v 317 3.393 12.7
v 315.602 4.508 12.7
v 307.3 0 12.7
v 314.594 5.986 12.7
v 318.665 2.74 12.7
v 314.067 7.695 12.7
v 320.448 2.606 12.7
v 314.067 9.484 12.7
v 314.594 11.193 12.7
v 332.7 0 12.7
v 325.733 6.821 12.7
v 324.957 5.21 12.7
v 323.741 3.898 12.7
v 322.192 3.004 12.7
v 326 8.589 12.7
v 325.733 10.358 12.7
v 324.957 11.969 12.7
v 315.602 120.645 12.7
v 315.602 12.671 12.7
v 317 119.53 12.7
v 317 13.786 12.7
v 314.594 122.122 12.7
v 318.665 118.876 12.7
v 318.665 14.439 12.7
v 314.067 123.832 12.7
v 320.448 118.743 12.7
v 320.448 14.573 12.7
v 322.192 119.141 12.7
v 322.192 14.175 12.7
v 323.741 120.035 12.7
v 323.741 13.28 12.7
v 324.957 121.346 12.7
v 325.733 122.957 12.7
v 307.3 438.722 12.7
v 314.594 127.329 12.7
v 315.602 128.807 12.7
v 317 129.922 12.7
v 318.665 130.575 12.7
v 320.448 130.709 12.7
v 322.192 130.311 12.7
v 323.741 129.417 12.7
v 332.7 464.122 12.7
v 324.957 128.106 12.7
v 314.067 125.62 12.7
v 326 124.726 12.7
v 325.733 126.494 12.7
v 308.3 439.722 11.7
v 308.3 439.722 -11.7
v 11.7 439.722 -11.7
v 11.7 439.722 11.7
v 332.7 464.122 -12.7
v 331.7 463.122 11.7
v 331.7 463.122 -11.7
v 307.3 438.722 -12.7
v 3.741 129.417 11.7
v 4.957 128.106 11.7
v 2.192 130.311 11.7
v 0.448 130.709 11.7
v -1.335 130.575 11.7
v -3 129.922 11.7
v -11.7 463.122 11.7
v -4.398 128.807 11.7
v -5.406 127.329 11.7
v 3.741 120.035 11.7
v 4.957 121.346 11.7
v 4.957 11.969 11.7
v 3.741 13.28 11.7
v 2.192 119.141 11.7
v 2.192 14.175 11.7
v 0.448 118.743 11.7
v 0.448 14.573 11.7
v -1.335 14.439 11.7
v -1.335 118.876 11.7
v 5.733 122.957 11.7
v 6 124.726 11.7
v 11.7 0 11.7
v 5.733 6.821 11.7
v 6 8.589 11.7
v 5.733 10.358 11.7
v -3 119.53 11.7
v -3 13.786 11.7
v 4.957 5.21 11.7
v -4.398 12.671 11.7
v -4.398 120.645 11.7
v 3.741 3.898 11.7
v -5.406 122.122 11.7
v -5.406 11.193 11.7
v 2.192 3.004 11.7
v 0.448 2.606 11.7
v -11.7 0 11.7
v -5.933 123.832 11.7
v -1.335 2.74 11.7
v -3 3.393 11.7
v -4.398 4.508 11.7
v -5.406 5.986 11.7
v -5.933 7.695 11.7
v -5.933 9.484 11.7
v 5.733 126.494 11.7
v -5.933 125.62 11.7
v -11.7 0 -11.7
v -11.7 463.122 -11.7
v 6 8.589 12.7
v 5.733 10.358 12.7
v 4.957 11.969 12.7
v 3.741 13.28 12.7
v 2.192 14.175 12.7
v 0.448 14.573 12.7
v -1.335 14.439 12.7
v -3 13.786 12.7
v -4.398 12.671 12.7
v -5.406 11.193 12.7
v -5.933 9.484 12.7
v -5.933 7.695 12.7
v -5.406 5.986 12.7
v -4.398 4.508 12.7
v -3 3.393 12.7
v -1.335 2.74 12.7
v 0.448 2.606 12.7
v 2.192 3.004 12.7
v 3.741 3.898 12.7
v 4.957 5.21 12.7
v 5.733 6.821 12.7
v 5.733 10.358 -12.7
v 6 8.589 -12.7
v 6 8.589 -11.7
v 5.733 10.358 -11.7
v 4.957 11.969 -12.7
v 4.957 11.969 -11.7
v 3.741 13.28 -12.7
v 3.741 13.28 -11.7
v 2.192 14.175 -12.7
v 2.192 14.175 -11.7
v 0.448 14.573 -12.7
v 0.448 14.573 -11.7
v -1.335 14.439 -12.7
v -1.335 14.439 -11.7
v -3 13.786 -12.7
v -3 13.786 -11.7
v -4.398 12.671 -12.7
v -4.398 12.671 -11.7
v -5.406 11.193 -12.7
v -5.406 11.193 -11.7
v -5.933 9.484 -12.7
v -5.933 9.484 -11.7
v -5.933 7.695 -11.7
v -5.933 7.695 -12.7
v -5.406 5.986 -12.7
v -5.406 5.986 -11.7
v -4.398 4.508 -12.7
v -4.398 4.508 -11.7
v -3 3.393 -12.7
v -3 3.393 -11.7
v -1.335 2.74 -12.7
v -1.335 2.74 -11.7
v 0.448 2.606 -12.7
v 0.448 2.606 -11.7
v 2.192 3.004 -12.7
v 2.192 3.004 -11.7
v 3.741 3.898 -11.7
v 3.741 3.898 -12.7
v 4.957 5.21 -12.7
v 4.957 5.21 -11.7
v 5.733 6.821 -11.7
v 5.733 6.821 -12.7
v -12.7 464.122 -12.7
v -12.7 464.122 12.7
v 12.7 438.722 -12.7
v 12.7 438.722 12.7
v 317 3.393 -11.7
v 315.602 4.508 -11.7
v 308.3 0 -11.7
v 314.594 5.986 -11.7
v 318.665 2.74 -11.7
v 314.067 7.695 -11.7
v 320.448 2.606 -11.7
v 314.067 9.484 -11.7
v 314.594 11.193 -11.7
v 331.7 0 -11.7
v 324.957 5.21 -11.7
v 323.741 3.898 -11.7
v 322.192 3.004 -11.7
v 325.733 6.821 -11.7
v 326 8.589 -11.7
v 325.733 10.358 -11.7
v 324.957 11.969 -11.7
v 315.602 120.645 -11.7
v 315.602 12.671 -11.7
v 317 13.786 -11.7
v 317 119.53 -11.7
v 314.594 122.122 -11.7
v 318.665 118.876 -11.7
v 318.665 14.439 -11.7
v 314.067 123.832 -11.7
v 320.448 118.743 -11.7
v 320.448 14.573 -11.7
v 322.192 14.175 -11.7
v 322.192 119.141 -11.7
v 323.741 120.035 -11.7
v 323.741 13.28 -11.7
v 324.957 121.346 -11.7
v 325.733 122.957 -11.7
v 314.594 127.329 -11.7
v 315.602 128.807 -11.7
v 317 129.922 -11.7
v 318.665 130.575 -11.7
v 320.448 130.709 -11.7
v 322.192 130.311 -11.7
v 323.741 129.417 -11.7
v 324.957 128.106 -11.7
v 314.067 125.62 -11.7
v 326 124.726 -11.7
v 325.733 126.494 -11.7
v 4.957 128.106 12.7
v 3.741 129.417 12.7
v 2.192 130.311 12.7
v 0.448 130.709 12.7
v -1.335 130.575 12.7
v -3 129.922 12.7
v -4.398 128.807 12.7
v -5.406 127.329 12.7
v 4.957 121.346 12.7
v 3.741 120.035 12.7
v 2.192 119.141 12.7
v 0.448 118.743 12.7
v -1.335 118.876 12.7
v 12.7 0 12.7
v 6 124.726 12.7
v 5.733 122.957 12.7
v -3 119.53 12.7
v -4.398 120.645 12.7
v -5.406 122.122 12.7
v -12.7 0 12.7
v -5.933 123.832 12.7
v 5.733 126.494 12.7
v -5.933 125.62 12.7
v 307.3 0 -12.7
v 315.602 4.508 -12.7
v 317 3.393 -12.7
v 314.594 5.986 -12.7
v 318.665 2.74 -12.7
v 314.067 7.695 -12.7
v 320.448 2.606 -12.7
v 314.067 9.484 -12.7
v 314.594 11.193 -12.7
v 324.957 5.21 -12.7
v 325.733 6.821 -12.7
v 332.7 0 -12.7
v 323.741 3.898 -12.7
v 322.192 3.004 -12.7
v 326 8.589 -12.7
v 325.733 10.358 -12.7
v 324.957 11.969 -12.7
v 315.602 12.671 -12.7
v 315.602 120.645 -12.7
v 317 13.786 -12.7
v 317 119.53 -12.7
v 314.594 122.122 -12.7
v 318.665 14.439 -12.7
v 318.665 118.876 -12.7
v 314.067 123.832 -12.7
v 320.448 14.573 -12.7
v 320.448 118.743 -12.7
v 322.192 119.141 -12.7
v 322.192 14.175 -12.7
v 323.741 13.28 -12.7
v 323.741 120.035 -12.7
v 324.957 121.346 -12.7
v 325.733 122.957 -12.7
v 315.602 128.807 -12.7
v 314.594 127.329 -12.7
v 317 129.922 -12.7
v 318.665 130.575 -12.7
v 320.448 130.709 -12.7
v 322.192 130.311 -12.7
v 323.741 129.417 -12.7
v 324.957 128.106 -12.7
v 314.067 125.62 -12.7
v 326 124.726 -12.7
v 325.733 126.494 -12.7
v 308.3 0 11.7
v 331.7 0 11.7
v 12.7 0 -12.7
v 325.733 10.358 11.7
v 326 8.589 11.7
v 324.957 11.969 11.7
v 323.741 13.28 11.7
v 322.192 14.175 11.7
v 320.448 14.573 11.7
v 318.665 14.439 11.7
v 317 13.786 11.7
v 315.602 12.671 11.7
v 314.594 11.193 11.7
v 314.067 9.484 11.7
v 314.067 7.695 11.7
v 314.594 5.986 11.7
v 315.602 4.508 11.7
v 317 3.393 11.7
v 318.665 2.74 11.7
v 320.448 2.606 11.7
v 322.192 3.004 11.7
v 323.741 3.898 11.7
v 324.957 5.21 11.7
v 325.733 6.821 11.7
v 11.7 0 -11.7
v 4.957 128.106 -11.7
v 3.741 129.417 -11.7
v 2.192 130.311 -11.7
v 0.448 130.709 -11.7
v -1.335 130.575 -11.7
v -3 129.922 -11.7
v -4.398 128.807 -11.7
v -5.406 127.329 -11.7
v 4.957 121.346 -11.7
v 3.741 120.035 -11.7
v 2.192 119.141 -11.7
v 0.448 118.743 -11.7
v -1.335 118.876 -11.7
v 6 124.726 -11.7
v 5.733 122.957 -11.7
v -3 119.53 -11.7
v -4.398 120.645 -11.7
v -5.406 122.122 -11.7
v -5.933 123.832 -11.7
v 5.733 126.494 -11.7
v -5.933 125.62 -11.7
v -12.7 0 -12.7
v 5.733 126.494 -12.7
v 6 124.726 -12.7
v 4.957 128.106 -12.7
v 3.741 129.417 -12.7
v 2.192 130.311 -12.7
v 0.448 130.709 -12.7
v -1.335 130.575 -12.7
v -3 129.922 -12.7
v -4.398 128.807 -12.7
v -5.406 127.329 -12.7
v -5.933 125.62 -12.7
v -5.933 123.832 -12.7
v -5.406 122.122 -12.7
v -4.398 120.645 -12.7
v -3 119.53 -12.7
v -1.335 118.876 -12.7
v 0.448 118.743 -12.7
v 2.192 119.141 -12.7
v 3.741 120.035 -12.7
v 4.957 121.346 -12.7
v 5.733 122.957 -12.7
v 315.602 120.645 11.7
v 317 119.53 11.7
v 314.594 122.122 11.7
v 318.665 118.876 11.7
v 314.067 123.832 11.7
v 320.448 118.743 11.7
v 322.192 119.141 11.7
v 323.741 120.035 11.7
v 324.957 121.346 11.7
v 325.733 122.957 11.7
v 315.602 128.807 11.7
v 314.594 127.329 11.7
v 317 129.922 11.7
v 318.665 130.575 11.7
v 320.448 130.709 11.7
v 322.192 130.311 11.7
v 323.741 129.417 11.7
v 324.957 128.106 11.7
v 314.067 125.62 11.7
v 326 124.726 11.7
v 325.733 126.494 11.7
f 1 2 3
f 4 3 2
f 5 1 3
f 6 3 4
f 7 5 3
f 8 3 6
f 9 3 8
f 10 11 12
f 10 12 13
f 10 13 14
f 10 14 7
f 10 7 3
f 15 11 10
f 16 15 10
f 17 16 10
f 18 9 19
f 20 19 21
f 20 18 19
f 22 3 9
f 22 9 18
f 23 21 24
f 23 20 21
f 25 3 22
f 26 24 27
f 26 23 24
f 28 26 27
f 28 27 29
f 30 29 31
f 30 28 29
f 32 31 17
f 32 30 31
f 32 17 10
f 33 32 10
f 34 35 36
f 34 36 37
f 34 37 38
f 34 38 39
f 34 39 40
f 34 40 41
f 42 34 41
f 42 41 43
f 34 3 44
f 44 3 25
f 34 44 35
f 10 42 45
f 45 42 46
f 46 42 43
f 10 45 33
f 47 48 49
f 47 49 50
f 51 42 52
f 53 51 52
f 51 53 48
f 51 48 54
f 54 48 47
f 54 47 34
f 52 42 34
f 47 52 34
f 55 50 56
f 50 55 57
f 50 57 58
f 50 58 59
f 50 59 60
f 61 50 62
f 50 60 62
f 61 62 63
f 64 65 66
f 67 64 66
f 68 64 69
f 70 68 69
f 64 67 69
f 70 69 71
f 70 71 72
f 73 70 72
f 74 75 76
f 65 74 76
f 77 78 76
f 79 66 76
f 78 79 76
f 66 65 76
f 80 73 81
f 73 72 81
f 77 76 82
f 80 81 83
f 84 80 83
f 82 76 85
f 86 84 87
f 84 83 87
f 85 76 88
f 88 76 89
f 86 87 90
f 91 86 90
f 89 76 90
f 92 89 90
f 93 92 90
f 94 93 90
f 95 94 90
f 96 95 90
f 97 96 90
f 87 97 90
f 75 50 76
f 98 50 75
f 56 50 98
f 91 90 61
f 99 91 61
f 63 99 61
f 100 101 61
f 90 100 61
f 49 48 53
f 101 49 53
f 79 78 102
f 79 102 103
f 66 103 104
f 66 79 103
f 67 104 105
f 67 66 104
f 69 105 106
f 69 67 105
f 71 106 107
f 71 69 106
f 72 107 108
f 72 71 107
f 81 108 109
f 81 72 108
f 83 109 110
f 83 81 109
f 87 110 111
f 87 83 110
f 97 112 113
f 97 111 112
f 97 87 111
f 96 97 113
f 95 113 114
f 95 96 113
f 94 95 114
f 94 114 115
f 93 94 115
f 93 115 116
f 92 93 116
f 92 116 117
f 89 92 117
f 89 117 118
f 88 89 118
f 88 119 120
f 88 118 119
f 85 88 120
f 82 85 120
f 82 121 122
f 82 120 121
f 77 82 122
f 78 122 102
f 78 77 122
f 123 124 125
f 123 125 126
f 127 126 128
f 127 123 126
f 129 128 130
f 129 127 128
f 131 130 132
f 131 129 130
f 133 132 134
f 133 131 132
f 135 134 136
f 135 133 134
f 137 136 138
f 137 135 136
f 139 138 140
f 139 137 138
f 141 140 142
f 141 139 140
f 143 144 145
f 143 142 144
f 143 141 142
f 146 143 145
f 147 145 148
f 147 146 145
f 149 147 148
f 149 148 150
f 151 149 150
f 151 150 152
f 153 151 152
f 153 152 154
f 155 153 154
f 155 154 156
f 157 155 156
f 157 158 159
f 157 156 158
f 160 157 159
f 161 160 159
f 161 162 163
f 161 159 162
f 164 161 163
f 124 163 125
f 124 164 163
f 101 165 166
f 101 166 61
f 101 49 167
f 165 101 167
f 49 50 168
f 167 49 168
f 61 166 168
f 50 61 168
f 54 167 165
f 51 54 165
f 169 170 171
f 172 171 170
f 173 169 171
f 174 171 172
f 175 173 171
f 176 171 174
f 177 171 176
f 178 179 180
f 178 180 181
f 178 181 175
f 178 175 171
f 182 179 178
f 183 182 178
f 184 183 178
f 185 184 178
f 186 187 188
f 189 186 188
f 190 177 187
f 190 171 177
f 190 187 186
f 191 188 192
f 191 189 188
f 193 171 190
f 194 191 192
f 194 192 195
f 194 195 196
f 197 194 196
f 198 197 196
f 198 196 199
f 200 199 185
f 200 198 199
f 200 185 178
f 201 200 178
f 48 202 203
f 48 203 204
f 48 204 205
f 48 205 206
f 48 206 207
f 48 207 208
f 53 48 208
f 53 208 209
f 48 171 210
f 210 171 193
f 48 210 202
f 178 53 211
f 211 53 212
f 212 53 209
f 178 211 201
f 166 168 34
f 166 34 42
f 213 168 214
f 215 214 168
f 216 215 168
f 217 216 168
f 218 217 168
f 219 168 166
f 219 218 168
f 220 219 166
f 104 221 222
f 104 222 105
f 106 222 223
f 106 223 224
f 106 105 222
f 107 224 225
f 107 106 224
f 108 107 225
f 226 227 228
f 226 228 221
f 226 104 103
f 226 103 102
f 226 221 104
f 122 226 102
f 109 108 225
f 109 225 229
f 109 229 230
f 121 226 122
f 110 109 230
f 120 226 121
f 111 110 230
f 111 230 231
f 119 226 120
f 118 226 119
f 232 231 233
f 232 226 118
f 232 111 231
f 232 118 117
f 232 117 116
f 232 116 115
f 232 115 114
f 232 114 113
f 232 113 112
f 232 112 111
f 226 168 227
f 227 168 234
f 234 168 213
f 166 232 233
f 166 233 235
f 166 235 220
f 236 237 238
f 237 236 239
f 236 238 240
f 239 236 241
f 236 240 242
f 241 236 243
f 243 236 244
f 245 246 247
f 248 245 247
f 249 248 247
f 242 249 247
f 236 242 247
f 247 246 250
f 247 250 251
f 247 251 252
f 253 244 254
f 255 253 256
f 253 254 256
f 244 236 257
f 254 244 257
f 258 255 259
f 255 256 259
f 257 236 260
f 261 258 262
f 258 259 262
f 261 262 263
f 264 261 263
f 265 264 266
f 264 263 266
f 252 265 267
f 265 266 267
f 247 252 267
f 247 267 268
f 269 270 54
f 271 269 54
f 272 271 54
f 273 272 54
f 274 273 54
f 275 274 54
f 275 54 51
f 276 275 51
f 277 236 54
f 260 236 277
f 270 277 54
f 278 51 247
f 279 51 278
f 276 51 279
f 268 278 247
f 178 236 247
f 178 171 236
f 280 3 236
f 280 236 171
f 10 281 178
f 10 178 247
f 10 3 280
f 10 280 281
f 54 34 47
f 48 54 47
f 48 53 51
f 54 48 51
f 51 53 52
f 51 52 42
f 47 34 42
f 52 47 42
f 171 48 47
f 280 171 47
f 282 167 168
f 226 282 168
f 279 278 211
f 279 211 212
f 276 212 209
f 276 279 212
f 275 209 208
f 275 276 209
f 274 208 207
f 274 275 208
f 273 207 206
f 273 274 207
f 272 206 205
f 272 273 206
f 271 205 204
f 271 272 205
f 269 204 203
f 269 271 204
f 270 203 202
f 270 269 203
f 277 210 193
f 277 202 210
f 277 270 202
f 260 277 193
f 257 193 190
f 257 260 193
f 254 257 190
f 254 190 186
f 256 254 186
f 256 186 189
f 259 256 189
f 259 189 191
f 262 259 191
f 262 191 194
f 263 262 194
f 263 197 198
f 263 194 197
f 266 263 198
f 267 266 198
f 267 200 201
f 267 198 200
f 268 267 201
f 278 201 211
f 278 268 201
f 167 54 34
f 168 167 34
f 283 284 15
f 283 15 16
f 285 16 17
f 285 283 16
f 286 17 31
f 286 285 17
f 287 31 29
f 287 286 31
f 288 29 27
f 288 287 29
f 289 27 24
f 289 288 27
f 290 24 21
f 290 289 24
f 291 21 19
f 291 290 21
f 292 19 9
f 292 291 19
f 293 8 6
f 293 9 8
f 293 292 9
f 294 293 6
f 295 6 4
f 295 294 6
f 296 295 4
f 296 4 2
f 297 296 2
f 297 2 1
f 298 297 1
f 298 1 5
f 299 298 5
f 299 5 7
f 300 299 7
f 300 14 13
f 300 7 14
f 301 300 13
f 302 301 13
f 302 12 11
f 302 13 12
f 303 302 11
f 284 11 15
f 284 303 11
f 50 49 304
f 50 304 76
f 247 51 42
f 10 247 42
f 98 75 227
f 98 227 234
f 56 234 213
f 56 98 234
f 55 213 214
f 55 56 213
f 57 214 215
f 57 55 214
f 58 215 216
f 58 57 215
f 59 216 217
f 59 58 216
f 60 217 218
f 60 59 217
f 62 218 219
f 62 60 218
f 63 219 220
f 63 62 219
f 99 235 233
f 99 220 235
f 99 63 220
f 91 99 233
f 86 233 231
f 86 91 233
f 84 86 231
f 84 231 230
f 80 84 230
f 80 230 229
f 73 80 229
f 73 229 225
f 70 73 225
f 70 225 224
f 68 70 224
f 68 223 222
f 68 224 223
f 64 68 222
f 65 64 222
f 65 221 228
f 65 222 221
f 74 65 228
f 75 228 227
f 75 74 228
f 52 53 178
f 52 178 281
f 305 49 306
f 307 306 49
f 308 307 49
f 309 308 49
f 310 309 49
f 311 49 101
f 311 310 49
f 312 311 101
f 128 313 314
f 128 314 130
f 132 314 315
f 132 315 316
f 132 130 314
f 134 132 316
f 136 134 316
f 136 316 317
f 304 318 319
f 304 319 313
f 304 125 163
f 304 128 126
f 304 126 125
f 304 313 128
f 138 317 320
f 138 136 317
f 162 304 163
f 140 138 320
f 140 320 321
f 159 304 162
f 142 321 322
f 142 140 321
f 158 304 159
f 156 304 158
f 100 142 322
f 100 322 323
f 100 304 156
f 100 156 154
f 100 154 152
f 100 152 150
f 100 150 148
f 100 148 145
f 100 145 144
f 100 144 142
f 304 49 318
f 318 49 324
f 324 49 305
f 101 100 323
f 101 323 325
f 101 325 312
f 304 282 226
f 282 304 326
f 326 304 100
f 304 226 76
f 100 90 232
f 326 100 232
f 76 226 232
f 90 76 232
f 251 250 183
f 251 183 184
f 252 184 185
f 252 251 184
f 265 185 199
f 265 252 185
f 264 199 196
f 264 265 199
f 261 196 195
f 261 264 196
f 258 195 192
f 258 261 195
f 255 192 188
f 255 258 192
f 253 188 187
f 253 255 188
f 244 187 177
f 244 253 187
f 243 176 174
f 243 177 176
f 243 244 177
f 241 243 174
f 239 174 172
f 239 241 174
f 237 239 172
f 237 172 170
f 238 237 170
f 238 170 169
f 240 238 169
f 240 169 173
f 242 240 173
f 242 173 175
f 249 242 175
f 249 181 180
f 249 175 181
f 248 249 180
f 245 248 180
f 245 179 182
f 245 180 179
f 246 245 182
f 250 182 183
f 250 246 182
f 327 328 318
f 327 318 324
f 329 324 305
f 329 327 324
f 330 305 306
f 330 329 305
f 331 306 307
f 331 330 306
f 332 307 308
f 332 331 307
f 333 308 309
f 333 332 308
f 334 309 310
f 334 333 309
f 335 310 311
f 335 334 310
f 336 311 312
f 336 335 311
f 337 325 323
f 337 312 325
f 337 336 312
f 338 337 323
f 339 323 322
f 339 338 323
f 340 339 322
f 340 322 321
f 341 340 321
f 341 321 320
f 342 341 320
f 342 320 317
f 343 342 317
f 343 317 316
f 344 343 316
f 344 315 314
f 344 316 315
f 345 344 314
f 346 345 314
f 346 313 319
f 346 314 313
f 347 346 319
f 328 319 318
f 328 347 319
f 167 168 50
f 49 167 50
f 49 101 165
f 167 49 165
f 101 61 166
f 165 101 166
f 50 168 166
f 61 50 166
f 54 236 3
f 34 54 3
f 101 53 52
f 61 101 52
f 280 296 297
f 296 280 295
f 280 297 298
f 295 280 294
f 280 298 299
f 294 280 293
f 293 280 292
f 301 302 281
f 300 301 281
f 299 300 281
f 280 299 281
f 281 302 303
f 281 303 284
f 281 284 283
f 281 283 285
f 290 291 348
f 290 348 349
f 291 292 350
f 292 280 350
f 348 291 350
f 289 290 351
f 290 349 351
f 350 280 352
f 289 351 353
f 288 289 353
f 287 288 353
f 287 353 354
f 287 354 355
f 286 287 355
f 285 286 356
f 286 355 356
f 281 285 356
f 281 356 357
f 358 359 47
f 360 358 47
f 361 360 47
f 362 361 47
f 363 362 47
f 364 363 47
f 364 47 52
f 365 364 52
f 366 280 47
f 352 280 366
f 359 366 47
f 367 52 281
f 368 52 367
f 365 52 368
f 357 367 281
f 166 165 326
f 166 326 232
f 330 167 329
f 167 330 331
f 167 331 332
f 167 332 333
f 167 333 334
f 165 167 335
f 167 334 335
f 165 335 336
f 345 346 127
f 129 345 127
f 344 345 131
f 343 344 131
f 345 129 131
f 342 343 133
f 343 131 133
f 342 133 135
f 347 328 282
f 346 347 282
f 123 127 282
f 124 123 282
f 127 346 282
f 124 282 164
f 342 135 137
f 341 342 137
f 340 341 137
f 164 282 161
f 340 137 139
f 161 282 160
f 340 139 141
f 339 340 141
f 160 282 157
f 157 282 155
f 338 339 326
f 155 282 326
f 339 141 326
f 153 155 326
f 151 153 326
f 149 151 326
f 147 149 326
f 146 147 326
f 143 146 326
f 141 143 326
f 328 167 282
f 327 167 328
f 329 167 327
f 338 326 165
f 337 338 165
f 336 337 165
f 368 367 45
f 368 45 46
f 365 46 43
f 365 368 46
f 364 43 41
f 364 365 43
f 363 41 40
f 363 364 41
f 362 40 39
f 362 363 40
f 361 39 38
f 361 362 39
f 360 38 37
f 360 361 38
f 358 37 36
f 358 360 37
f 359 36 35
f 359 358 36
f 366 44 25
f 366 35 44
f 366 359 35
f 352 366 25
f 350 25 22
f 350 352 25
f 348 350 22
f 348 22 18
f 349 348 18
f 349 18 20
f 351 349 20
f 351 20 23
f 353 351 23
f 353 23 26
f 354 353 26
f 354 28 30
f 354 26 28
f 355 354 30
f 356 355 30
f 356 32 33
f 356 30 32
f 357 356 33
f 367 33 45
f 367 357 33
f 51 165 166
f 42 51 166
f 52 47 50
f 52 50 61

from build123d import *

# Parameters (mm, degrees)
SKETCH1_ON_SEGMENT_1_W                   = 25.4
SKETCH1_ON_SEGMENT_1_H                   = 25.4
SKETCH1_ON_SEGMENT_1_W_2                 = 23.4
SKETCH1_ON_SEGMENT_1_H_2                 = 23.4
SQURE_TUBE_1X1SQUARE_TUBE_1_DEPTH        = 470.382821159
SKETCH1_ON_SEGMENT_2_W                   = 25.4
SKETCH1_ON_SEGMENT_2_H                   = 25.4
SKETCH1_ON_SEGMENT_2_W_2                 = 23.4
SKETCH1_ON_SEGMENT_2_H_2                 = 23.4
SQURE_TUBE_1X1SQUARE_TUBE_1_2_DEPTH      = 357.921024484
SQURE_TUBE_1X1SQUARE_TUBE_1_3_DEPTH      = 451.422308917
SQURE_TUBE_1X1SQUARE_TUBE_1_3_DEPTH_BACK = 18.960512242
SKETCH1_W                                = 25.4
SKETCH1_H                                = 25.4
SKETCH1_W_2                              = 23.4
SKETCH1_H_2                              = 23.4
CUT_EXTRUDE1_DEPTH                       = 572.615226909
CUT_EXTRUDE1_DEPTH_BACK                  = 572.615226909
SKETCH2_R                                = 6


with BuildPart() as part:
    # Sketch1 on segment 1 (carried to segment 1) → Squre tube 1X1SQUARE TUBE(1) (new body)
    with BuildSketch(Plane(origin=(0, 0, 0), x_dir=(-1, 0, 0), z_dir=(0, 1, 0))):
        Rectangle(SKETCH1_ON_SEGMENT_1_W, SKETCH1_ON_SEGMENT_1_H)
        Rectangle(SKETCH1_ON_SEGMENT_1_W_2, SKETCH1_ON_SEGMENT_1_H_2, mode=Mode.SUBTRACT)
    extrude(amount=SQURE_TUBE_1X1SQUARE_TUBE_1_DEPTH)

    # Squre tube 1X1SQUARE TUBE(1) mitre 1
    split(bisect_by=Plane(origin=(0, 451.422308917, 0), x_dir=(0.707106781, -0.707106781, 0), z_dir=(-0.707106781, -0.707106781, 0)), keep=Keep.TOP)


with BuildPart() as body_2:
    # Sketch1 on segment 2 (carried to segment 2) → Squre tube 1X1SQUARE TUBE_1 2 (new body)
    with BuildSketch(Plane(origin=(-18.960512242, 451.422308917, 0), x_dir=(0, 1, 0), z_dir=(1, 0, 0))):
        Rectangle(SKETCH1_ON_SEGMENT_2_W, SKETCH1_ON_SEGMENT_2_H)
        Rectangle(SKETCH1_ON_SEGMENT_2_W_2, SKETCH1_ON_SEGMENT_2_H_2, mode=Mode.SUBTRACT)
    extrude(amount=SQURE_TUBE_1X1SQUARE_TUBE_1_2_DEPTH)

    # Squre tube 1X1SQUARE TUBE_1 2 mitre 1
    split(bisect_by=Plane(origin=(0, 451.422308917, 0), x_dir=(-0.707106781, 0.707106781, 0), z_dir=(0.707106781, 0.707106781, 0)), keep=Keep.TOP)

    # Squre tube 1X1SQUARE TUBE_1 2 mitre 2
    split(bisect_by=Plane(origin=(320, 451.422308917, 0), x_dir=(-0.707106781, -0.707106781, 0), z_dir=(-0.707106781, 0.707106781, 0)), keep=Keep.TOP)


with BuildPart() as body_3:
    # Sketch1 → Squre tube 1X1SQUARE TUBE_1 3 (new, two sides: drawn at the far end of the back side and taken through both)
    with BuildSketch(Plane(origin=(320, 451.422308917, 0), x_dir=(1, 0, 0), z_dir=(0, -1, 0)).offset(-SQURE_TUBE_1X1SQUARE_TUBE_1_3_DEPTH_BACK)):
        Rectangle(SKETCH1_W, SKETCH1_H)
        Rectangle(SKETCH1_W_2, SKETCH1_H_2, mode=Mode.SUBTRACT)
    extrude(amount=SQURE_TUBE_1X1SQUARE_TUBE_1_3_DEPTH + SQURE_TUBE_1X1SQUARE_TUBE_1_3_DEPTH_BACK)

    # Squre tube 1X1SQUARE TUBE_1 3 mitre 1
    split(bisect_by=Plane(origin=(320, 451.422308917, 0), x_dir=(0.707106781, 0.707106781, 0), z_dir=(0.707106781, -0.707106781, 0)), keep=Keep.TOP)


with BuildPart() as cut_extrude1_tool:
    # Sketch2 → Cut-Extrude1 (new, two sides: drawn at the far end of the back side and taken through both)
    with BuildSketch(Plane.XY.offset(12.7).offset(-CUT_EXTRUDE1_DEPTH_BACK)):
        with Locations((320, 124.72575792)):
            Circle(SKETCH2_R)
        with Locations((320, 8.589481736)):
            Circle(SKETCH2_R)
        with Locations((0, 8.589481736)):
            Circle(SKETCH2_R)
        with Locations((0, 124.72575792)):
            Circle(SKETCH2_R)
    extrude(amount=CUT_EXTRUDE1_DEPTH + CUT_EXTRUDE1_DEPTH_BACK)


with BuildPart() as part_1:
    add(part.part)

    # Cut-Extrude1: cut by cut_extrude1_tool
    add(cut_extrude1_tool.part, mode=Mode.SUBTRACT)


with BuildPart() as body_3_1:
    add(body_3.part)

    # Cut-Extrude1: cut by cut_extrude1_tool
    add(cut_extrude1_tool.part, mode=Mode.SUBTRACT)


solid = Compound([body_2.part, part_1.part, body_3_1.part])
